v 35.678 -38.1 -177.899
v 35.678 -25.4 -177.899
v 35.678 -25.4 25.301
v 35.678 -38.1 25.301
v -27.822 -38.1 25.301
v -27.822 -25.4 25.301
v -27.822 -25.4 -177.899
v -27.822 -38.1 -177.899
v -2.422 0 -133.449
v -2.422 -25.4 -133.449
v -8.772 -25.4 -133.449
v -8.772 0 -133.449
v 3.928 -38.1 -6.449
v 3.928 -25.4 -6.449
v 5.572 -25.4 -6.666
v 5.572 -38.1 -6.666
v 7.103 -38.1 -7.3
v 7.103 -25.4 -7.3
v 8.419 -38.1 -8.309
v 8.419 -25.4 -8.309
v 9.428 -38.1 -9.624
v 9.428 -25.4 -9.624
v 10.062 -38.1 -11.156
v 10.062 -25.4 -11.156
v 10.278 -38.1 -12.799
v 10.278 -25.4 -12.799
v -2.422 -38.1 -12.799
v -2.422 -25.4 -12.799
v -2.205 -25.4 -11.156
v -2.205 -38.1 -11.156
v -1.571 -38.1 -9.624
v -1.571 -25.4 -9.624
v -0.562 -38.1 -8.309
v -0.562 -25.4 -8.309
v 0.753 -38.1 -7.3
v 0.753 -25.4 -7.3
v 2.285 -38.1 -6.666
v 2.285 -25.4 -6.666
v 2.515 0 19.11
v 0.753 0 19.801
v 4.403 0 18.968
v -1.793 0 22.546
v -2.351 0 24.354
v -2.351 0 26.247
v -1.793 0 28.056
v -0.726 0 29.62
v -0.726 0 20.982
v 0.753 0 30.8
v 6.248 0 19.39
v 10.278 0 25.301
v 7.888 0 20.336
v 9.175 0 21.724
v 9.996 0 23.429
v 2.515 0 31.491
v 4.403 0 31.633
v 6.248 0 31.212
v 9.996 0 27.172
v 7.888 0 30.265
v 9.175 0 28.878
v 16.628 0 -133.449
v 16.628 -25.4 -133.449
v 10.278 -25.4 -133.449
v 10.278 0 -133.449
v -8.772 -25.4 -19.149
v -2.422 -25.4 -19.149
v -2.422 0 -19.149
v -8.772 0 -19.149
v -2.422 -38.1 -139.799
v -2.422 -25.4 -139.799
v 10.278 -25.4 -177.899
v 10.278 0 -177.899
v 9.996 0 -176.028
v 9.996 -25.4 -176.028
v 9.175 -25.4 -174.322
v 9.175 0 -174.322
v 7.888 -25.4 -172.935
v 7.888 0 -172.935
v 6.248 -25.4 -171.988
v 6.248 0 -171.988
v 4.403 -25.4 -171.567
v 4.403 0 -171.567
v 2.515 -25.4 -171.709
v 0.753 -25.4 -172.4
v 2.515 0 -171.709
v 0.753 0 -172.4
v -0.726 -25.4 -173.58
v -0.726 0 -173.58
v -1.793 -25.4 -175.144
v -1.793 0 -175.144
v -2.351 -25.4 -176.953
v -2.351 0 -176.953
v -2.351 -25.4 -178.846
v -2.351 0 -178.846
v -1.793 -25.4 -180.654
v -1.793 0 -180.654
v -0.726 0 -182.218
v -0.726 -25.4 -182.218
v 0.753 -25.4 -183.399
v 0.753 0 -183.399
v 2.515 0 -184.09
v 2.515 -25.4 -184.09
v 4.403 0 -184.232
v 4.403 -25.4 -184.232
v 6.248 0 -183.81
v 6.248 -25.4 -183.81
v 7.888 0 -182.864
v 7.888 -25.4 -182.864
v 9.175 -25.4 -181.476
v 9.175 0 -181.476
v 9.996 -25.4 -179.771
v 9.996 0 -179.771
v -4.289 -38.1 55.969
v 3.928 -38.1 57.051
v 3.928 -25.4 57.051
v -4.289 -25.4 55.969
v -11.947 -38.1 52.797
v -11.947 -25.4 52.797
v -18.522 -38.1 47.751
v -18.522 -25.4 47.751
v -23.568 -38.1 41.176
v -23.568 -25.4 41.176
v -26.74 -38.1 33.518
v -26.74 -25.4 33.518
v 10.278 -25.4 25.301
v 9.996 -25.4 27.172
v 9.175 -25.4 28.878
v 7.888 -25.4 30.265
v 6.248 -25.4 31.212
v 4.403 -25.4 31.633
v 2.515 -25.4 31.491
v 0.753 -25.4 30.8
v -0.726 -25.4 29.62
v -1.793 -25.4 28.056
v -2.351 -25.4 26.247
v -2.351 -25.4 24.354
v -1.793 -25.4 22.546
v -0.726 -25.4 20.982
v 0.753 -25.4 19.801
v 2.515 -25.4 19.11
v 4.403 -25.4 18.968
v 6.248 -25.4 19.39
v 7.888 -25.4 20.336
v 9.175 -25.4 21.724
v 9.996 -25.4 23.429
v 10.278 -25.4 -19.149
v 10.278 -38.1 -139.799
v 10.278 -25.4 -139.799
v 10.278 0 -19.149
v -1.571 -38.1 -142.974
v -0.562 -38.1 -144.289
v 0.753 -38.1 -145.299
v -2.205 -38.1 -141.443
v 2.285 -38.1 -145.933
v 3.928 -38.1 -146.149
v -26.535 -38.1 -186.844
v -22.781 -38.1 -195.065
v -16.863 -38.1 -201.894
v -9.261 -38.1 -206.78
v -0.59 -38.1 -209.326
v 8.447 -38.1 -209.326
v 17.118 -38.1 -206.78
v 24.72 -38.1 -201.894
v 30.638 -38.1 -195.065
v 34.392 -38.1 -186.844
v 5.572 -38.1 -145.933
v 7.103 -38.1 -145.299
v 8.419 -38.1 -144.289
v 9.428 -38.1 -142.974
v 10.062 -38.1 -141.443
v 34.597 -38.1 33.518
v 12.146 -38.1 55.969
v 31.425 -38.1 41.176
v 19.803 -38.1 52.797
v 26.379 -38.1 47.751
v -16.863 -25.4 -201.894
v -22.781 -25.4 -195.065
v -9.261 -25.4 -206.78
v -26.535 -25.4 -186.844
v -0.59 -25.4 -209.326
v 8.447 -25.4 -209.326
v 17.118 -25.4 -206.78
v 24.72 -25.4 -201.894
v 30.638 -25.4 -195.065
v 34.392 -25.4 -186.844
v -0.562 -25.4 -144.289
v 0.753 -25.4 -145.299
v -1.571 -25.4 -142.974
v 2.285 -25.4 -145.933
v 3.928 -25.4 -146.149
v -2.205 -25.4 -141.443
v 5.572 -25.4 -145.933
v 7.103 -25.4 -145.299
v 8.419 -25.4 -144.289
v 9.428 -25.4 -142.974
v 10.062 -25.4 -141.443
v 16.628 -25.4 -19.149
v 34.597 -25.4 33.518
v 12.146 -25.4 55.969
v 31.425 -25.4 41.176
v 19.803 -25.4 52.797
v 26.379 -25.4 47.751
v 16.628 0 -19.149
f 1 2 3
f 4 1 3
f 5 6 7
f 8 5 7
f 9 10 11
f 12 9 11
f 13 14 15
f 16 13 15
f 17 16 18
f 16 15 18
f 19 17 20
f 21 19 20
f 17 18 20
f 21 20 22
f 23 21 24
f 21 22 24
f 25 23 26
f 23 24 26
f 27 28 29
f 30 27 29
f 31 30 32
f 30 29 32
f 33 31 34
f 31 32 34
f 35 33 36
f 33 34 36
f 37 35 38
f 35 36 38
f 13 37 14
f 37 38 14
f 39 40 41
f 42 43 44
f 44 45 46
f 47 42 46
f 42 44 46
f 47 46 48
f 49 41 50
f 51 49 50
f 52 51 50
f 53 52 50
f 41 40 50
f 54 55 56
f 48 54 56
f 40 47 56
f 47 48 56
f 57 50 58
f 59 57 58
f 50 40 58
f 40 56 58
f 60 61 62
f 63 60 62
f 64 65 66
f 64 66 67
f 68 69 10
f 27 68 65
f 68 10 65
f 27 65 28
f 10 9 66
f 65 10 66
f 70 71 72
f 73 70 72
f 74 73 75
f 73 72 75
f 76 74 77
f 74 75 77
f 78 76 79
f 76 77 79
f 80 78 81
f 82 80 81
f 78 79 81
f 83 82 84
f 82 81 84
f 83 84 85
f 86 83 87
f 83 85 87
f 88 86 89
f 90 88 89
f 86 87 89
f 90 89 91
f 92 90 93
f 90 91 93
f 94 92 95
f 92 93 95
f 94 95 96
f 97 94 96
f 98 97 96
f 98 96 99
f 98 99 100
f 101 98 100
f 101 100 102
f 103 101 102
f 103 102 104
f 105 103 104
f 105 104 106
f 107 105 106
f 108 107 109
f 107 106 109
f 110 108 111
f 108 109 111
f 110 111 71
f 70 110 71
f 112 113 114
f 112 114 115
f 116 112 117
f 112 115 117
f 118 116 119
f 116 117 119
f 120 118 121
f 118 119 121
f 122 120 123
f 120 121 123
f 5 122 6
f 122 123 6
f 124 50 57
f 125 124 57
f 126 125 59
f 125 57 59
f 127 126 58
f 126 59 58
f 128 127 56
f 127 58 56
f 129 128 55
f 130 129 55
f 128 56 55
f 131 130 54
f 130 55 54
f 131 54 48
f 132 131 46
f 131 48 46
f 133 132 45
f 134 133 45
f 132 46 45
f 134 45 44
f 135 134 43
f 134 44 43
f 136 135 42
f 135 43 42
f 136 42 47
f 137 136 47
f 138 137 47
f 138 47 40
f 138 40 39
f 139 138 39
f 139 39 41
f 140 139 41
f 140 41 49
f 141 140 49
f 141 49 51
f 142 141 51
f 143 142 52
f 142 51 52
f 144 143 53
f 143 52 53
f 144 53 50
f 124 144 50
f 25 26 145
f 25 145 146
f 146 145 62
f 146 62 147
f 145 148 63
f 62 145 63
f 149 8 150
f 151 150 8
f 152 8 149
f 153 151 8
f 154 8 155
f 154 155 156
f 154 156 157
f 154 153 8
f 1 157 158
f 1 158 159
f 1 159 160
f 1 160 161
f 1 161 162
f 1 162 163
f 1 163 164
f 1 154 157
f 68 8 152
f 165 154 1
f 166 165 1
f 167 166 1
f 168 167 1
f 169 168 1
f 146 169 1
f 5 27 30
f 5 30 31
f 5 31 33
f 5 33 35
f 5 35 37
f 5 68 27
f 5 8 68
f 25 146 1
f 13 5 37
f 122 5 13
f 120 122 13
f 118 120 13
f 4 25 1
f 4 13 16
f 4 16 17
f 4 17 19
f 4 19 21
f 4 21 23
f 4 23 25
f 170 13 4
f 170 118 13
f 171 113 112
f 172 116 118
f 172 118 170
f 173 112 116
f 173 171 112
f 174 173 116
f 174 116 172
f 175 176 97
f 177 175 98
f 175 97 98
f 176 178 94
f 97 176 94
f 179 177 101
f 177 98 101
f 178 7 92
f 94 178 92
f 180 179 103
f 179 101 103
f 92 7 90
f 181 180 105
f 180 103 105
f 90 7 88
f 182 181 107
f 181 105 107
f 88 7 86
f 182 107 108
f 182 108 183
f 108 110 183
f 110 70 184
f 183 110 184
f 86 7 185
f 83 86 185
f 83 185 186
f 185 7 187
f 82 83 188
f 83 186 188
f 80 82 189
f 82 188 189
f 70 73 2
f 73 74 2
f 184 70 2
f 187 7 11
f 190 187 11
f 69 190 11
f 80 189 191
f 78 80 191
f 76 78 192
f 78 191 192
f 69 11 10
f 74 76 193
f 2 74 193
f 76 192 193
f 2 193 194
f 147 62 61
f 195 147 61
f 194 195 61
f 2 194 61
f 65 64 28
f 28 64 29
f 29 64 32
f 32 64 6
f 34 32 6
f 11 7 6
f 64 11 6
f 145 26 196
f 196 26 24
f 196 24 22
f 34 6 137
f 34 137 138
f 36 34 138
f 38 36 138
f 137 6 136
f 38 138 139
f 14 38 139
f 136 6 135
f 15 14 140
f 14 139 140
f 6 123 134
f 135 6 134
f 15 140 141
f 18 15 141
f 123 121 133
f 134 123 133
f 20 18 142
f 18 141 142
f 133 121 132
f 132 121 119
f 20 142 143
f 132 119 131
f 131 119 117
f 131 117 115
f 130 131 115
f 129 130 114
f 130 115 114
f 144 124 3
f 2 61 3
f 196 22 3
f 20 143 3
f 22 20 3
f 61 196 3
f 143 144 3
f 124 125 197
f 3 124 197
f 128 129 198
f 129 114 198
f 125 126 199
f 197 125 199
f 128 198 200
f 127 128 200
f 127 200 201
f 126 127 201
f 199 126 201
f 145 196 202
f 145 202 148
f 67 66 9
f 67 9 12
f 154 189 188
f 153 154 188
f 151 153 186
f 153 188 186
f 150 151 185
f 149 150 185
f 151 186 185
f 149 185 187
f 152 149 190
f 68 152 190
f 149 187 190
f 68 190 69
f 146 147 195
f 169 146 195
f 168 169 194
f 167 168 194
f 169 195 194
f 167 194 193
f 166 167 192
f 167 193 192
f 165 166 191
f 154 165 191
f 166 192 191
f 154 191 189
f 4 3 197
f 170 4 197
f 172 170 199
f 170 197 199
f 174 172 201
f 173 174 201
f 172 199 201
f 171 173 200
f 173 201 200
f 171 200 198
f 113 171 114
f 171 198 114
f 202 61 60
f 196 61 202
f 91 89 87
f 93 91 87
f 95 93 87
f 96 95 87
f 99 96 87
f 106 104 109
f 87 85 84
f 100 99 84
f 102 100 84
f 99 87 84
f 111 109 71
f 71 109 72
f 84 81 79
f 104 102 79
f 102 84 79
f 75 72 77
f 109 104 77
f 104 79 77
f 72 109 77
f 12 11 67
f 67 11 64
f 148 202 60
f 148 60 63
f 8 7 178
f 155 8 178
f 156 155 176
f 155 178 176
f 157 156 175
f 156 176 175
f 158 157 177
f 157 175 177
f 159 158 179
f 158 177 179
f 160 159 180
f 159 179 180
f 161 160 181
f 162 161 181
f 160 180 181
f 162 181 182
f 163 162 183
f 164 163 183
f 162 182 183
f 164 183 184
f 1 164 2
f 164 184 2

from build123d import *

# Parameters (mm, degrees)
F0_R     = 6.35
F1_DEPTH = 25.4
F3_DEPTH = 12.7
F4_W     = 6.35
F4_H     = 114.3
F5_DEPTH = 25.4


with BuildPart() as f1:
    # F0 (on Front) → F1 (new body)
    with BuildSketch(Plane.XZ):
        with Locations((3.9284797385, 25.3006741405)):
            Circle(F0_R)
    extrude(amount=F1_DEPTH)



with BuildPart() as f1b:
    # F0 (on Front) → F1, piece 2 (new body)
    with BuildSketch(Plane.XZ):
        with Locations((3.9284797385, -177.8993258595)):
            Circle(F0_R)
    extrude(amount=F1_DEPTH)


with BuildPart() as f1_1:
    add(f1.part)

    add(f1b.part)  # F3 merges F1b
    # F2 (on face) → F3 (join)
    with BuildSketch(Plane.XZ.offset(25.4)):
        with BuildLine():
            ThreePointArc((3.9284797385, 57.0506741405), (-18.5221605641, 47.7513144431), (-27.8215202615, 25.3006741405))
            Line((-27.8215202615, 25.3006741405), (-27.8215202615, -177.8993258595))
            ThreePointArc((-27.8215202615, -177.8993258595), (-18.5221605641, -200.3499661622), (3.9284797385, -209.6493258595))
            ThreePointArc((3.9284797385, -209.6493258595), (26.3791200412, -200.3499661622), (35.6784797385, -177.8993258595))
            Line((35.6784797385, -177.8993258595), (35.6784797385, 25.3006741405))
            ThreePointArc((35.6784797385, 25.3006741405), (26.3791200412, 47.7513144431), (3.9284797385, 57.0506741405))
        make_face()
        with BuildLine():
            ThreePointArc((3.9284797385, -6.4493258595), (8.4186077991, -8.309197799), (10.2784797385, -12.7993258595))
            Line((10.2784797385, -12.7993258595), (10.2784797385, -139.7993258595))
            ThreePointArc((10.2784797385, -139.7993258595), (8.4186077991, -144.2894539201), (3.9284797385, -146.1493258595))
            ThreePointArc((3.9284797385, -146.1493258595), (-0.561648322, -144.2894539201), (-2.4215202615, -139.7993258595))
            Line((-2.4215202615, -139.7993258595), (-2.4215202615, -12.7993258595))
            ThreePointArc((-2.4215202615, -12.7993258595), (-0.561648322, -8.309197799), (3.9284797385, -6.4493258595))
        make_face(mode=Mode.SUBTRACT)
    extrude(amount=F3_DEPTH)

    # F4 (on face) → F5 (join)
    with BuildSketch(Plane(origin=(0, -25.4, 0), x_dir=(-1, 0, 0), z_dir=(0, 1, 0))):
        with Locations((5.5965202615, -76.2993258595)):
            Rectangle(F4_W, F4_H)
        with Locations((-13.4534797385, -76.2993258595)):
            Rectangle(F4_W, F4_H)
    extrude(amount=F5_DEPTH)


solid = f1_1.part
